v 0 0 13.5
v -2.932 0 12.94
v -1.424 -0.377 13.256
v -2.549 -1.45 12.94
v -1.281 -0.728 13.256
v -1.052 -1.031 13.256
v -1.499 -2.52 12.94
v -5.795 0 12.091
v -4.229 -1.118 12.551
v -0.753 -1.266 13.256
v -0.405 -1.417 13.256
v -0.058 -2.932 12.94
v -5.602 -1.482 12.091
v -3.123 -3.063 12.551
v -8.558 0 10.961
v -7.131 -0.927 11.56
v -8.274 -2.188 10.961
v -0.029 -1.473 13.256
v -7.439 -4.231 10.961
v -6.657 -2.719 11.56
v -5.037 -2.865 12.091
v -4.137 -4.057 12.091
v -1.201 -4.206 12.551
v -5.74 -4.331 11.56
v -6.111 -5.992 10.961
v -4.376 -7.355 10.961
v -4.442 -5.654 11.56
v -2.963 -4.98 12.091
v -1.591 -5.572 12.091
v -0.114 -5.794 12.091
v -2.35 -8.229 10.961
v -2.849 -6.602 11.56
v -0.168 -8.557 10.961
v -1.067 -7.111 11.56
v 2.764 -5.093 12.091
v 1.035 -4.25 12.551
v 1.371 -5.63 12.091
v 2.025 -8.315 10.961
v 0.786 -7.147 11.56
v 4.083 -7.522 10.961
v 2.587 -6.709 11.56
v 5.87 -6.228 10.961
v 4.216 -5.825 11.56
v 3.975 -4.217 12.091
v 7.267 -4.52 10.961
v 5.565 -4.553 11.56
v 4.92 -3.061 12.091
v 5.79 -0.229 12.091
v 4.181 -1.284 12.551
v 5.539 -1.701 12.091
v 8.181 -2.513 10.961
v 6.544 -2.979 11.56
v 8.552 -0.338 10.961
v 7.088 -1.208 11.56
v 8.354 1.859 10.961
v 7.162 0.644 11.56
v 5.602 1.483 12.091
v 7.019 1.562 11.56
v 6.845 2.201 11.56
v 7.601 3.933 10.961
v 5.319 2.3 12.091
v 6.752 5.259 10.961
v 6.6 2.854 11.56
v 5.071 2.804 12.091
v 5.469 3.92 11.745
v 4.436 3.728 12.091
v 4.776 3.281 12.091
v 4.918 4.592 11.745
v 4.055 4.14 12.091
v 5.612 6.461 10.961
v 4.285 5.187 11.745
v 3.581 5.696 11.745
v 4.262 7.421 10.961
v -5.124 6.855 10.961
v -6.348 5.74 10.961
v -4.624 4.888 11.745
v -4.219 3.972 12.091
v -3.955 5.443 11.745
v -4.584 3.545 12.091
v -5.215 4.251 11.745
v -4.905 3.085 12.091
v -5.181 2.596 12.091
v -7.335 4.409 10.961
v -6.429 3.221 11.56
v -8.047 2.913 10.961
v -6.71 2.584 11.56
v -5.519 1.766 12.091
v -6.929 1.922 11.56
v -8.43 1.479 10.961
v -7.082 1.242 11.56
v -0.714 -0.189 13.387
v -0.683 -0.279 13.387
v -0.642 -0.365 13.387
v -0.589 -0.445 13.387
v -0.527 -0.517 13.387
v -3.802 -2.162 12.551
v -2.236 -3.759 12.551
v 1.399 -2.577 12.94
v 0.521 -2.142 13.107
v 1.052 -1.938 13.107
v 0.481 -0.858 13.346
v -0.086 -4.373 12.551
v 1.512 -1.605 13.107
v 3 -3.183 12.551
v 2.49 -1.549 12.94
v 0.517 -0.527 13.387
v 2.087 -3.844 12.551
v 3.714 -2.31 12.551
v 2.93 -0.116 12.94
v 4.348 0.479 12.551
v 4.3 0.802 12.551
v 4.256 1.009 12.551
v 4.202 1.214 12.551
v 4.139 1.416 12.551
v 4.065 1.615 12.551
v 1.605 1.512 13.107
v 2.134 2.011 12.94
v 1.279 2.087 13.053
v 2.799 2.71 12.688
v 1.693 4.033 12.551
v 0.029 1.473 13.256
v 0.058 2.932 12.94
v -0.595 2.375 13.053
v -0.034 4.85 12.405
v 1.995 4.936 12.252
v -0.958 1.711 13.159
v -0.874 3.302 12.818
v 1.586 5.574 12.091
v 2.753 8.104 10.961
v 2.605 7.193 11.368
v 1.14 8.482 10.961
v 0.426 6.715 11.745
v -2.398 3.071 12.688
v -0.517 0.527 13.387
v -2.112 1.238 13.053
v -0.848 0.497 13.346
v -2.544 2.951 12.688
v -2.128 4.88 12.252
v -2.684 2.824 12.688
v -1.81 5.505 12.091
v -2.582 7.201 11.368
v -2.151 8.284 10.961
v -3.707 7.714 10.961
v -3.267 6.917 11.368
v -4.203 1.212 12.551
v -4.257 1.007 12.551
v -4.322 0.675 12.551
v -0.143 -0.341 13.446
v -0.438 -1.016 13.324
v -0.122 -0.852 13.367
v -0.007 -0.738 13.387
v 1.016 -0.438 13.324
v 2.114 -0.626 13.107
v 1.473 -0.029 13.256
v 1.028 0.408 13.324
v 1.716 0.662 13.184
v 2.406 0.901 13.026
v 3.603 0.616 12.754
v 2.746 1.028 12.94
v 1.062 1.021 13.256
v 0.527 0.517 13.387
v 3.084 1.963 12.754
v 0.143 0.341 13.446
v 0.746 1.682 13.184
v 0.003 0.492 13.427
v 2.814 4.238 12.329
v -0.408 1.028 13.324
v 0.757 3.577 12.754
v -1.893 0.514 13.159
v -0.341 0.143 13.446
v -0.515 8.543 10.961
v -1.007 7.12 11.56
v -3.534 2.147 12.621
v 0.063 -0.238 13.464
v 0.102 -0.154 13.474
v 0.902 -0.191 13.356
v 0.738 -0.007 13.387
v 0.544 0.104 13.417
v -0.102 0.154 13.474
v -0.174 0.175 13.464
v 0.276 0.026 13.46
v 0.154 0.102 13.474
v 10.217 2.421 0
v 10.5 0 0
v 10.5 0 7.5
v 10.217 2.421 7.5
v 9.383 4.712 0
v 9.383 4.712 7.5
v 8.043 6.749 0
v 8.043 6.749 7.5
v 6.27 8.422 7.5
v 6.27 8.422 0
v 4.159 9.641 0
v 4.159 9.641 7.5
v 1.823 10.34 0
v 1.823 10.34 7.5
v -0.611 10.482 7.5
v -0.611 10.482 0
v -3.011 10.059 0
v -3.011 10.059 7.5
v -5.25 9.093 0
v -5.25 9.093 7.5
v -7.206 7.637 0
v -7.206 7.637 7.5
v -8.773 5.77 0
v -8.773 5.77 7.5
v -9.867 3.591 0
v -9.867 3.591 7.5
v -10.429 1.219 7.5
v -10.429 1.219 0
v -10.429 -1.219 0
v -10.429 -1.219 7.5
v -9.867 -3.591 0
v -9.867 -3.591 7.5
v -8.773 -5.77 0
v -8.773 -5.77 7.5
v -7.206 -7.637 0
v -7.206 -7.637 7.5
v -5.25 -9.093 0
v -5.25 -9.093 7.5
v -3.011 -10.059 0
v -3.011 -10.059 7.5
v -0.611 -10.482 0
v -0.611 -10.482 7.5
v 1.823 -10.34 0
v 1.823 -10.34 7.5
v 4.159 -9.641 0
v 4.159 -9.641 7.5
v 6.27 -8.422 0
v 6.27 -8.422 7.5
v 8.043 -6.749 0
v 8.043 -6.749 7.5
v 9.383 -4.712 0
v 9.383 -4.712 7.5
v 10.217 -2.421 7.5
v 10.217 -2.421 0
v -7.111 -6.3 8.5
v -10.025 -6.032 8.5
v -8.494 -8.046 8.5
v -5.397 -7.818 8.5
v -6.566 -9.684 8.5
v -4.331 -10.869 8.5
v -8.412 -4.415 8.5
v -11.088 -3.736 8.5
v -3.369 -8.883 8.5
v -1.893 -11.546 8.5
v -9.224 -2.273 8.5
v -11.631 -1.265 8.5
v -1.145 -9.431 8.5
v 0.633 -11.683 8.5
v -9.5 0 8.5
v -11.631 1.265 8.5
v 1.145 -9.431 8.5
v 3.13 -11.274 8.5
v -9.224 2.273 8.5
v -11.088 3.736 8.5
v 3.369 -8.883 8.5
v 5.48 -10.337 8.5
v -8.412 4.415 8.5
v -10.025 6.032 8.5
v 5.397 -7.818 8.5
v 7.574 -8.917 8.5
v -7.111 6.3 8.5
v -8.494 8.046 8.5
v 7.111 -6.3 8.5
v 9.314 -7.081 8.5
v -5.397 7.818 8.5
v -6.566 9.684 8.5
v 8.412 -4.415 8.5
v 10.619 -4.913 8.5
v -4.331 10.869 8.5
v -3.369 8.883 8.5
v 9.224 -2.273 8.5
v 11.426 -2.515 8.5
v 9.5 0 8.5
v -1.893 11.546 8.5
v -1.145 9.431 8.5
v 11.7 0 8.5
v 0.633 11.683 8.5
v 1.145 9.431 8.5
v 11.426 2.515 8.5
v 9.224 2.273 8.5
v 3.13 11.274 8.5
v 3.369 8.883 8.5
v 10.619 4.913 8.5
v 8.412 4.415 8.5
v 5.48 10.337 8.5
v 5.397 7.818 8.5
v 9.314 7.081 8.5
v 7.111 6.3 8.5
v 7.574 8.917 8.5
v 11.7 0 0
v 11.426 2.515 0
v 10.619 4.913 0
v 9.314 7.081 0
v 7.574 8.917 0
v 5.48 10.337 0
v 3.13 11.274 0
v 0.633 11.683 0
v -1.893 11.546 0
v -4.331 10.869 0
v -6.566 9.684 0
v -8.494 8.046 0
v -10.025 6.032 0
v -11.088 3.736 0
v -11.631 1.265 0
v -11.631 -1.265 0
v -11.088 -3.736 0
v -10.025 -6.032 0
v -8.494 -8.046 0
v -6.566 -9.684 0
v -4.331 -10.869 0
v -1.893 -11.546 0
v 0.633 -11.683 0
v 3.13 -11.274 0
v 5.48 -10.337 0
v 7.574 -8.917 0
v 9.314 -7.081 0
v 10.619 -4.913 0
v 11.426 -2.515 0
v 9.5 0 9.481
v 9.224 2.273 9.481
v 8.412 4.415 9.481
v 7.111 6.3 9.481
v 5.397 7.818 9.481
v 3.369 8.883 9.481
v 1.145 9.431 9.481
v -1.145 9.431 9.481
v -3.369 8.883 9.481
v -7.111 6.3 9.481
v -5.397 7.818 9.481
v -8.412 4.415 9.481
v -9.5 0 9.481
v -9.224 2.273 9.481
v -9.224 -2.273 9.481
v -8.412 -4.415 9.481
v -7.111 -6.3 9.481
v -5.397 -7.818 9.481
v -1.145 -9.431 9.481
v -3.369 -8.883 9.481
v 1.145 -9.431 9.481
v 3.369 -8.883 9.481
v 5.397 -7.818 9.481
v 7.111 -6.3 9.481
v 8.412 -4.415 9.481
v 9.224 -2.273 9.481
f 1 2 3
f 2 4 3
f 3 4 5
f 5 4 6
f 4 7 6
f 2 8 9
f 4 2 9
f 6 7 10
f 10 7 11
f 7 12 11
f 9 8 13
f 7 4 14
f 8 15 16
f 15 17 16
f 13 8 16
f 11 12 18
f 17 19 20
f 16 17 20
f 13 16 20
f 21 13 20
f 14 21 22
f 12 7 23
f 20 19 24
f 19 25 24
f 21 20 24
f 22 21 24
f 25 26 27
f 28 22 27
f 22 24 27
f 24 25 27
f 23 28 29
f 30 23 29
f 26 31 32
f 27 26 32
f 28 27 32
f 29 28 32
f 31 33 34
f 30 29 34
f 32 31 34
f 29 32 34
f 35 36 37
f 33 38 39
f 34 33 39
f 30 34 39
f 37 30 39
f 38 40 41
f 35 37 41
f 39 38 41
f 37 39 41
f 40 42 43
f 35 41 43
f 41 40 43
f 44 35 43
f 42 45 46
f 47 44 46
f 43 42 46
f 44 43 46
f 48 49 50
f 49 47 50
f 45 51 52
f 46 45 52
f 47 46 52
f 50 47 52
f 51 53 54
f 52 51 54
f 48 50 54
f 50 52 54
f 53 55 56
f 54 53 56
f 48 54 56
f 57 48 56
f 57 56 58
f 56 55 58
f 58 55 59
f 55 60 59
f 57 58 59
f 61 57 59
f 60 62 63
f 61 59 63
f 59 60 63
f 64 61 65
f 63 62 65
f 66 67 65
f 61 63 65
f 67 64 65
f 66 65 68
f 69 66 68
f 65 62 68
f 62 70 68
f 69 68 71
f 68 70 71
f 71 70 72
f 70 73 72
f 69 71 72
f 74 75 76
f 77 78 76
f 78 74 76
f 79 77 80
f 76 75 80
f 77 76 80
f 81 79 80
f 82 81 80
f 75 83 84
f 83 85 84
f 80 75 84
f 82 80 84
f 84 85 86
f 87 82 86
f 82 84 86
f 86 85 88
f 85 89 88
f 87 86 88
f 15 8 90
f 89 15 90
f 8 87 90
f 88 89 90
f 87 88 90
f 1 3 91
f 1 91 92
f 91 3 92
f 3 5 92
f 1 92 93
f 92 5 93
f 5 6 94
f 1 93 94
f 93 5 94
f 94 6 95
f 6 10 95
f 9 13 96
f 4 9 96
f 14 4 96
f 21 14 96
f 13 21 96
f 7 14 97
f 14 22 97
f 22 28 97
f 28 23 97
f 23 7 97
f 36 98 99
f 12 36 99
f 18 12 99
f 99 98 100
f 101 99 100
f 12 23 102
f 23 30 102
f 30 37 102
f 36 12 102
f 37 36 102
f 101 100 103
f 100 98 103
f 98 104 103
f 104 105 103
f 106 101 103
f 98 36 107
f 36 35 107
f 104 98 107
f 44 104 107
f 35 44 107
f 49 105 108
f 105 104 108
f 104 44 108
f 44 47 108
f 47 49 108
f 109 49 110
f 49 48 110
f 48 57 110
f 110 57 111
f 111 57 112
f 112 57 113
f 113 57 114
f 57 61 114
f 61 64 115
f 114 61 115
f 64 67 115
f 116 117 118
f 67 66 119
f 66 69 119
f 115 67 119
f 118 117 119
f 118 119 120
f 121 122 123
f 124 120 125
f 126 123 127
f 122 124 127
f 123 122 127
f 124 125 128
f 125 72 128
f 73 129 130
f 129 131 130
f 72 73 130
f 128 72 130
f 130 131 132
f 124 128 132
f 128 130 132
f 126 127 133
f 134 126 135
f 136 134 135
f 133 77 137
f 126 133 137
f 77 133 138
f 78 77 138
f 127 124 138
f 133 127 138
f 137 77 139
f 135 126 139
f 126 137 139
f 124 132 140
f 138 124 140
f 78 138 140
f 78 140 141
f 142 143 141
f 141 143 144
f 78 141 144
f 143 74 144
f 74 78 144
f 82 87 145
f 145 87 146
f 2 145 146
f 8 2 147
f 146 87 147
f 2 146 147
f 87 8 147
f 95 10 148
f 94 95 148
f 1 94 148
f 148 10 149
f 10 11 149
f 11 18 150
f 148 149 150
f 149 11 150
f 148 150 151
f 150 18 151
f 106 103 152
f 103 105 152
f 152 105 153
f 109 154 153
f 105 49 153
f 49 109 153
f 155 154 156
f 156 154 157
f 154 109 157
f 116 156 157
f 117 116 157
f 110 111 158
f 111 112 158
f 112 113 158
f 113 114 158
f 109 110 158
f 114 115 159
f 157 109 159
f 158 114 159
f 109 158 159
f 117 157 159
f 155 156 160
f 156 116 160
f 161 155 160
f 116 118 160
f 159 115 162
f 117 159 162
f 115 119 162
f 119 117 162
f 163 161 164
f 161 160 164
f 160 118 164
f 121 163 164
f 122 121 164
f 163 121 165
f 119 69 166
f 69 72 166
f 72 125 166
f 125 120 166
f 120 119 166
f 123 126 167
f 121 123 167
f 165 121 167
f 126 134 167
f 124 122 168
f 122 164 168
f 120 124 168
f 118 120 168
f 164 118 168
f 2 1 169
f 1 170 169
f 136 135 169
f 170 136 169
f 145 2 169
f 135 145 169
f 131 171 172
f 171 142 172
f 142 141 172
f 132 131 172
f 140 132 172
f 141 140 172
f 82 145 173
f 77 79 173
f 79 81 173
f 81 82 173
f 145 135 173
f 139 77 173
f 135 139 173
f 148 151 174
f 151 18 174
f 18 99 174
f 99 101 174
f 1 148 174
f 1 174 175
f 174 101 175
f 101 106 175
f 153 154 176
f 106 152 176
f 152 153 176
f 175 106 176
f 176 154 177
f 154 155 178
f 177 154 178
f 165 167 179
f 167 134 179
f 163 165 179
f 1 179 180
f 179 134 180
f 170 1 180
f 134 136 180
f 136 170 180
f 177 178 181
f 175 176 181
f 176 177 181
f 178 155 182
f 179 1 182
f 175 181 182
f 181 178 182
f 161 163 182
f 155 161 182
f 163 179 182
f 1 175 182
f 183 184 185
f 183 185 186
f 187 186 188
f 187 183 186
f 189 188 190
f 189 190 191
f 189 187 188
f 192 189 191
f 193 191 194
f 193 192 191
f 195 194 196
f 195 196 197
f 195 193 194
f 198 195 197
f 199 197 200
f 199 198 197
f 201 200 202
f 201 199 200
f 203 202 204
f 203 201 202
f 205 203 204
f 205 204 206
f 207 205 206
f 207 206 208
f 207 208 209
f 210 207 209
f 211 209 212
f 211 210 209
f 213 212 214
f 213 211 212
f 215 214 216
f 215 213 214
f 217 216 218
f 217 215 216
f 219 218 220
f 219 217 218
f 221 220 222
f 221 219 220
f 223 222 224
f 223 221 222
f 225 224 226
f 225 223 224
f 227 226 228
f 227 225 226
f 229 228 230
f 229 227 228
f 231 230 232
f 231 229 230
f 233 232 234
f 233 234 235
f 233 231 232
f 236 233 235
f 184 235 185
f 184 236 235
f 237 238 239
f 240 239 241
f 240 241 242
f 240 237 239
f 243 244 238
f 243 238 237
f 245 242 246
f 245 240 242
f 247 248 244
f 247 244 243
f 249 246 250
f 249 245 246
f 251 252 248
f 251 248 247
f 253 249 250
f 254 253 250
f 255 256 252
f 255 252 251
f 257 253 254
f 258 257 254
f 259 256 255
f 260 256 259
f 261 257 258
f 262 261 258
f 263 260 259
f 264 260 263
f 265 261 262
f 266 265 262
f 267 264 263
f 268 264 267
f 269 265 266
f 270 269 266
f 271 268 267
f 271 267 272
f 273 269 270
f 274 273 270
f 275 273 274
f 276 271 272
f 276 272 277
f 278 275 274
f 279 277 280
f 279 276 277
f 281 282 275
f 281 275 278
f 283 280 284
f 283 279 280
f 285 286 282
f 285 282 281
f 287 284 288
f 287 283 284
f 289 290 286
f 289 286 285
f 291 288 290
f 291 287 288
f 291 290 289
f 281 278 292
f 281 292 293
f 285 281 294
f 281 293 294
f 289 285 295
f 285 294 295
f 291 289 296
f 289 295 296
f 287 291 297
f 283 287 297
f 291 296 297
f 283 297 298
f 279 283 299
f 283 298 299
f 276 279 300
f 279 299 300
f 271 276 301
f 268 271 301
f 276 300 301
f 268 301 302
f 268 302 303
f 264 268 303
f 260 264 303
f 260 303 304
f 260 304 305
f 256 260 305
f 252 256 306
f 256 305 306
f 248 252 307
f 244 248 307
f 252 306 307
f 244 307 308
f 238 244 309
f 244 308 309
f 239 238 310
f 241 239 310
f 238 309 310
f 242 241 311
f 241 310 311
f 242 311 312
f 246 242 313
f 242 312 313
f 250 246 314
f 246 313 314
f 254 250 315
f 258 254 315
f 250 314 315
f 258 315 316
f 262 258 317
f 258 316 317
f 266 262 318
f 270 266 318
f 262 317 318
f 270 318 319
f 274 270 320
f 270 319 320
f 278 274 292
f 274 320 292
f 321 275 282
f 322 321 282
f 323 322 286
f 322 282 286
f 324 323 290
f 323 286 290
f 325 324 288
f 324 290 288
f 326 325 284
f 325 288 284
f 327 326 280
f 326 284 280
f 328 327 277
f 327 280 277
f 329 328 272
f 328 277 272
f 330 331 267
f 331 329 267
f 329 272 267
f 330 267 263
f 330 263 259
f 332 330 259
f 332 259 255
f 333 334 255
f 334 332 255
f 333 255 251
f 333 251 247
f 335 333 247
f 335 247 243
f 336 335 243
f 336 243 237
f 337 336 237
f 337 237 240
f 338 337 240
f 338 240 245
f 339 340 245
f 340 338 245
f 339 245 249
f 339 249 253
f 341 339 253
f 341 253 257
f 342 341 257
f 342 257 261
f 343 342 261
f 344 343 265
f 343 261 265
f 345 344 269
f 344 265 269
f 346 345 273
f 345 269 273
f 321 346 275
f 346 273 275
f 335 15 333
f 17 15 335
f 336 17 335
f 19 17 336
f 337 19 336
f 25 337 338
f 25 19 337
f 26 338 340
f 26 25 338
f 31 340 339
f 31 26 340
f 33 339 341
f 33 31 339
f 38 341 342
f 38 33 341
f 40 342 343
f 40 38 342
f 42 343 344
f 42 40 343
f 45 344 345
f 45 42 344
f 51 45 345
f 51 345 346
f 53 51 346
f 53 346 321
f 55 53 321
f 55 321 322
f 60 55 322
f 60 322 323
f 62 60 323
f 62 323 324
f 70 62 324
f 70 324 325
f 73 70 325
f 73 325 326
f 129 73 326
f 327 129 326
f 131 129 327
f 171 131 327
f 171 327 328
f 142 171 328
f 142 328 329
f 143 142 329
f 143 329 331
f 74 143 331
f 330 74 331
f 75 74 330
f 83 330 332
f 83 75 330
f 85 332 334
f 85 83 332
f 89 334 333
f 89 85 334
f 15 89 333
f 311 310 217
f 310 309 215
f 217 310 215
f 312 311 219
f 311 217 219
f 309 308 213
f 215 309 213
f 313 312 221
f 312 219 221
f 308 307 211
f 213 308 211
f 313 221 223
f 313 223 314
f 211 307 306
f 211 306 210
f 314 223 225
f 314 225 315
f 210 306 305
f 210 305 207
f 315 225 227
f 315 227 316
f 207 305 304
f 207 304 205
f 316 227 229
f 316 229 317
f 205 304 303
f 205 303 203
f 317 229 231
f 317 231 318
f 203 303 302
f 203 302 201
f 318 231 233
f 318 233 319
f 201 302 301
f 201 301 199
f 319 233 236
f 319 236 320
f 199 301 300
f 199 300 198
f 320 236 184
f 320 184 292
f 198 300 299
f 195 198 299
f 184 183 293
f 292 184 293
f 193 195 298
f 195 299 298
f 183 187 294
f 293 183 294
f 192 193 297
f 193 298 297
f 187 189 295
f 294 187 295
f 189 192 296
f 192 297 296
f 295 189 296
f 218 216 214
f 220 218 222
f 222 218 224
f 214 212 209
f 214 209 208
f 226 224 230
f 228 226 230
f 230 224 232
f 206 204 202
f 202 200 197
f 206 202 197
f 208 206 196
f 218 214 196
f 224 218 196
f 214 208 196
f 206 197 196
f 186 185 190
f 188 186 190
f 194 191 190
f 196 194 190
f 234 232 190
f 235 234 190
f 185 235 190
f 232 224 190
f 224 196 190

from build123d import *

# Parameters (mm, degrees)
F0_R        = 11.7
F0_R_2      = 10.5
F1_DEPTH    = 8.5
F2_DEPTH    = 7.5
F3_R        = 9.5
F4_DEPTH    = 2
F7_T2_ANGLE = 180
F7_T4_ANGLE = 180


# Not quite as in the source:
# - a fillet or chamfer that OpenCascade refuses, or shapes differently, is made with other operations: its cross-section is extruded or revolved along the edge and cut away or added
# - a feature names something its author has since deleted; it is built from what else it names


with BuildPart() as f1:
    # F0 (on Top) → F1 (new body)
    with BuildSketch(Plane.XY):
        Circle(F0_R)
        Circle(F0_R_2, mode=Mode.SUBTRACT)
        Circle(F0_R_2)
    extrude(amount=F1_DEPTH)

    # F0 (on Top) → F2 (cut)
    with BuildSketch(Plane.XY):
        Circle(F0_R_2)
    extrude(amount=F2_DEPTH, mode=Mode.SUBTRACT)

    # F3 (on face) → F4 (join)
    with BuildSketch(Plane.XY.offset(8.5)):
        Circle(F3_R)
    extrude(amount=F4_DEPTH)

    # F5 (on Front) → F6 (revolve)
    with BuildSketch(Plane.XZ):
        with BuildLine():
            Line((-9.5, 10.5), (0, 10.5))
            Line((0, 10.5), (0, 13.5))
            ThreePointArc((0, 13.5), (-4.8754462608, 12.3972464927), (-9.5, 10.5))
        make_face()
    revolve(axis=Axis((0, 0, 12.3332124203), (0, 0, 1)))

    # F7: chamfer of 1 on 2 edges, made by hand

    # F7_s1 → F7_t2 (revolve, cut)
    with BuildSketch(Plane.XZ):
        with BuildLine():
            Line((-9.5214673898, 9.4467860572), (-8.5368878452, 10.9947550164))
            Line((-8.5368878452, 10.9947550164), (-8.5453666245, 11.0128688316))
            ThreePointArc((-8.5453666245, 11.0128688316), (-9.0246542065, 10.7600809063), (-9.5091067674, 10.5178063693))
            Line((-9.5091067674, 10.5178063693), (-9.52, 10.5))
            ThreePointArc((-9.52, 10.5), (-9.52, 9.9733930286), (-9.5414673898, 9.4467860572))
            Line((-9.5414673898, 9.4467860572), (-9.5214673898, 9.4467860572))
        make_face()
    revolve(axis=Axis((0, 0, 10.5), (0, 0, 1)), revolution_arc=F7_T2_ANGLE, mode=Mode.SUBTRACT)

    # F7_s3 → F7_t4 (revolve, cut)
    with BuildSketch(Plane.XZ):
        with BuildLine():
            Line((9.5214673898, 9.4467860572), (8.5368878452, 10.9947550164))
            Line((8.5368878452, 10.9947550164), (8.5453666245, 11.0128688316))
            ThreePointArc((8.5453666245, 11.0128688316), (9.0246542065, 10.7600809063), (9.5091067674, 10.5178063693))
            Line((9.5091067674, 10.5178063693), (9.52, 10.5))
            ThreePointArc((9.52, 10.5), (9.52, 9.9733930286), (9.5414673898, 9.4467860572))
            Line((9.5414673898, 9.4467860572), (9.5214673898, 9.4467860572))
        make_face()
    revolve(axis=Axis((0, 0, 10.5), (0, 0, 1)), revolution_arc=F7_T4_ANGLE, mode=Mode.SUBTRACT)


solid = f1.part
